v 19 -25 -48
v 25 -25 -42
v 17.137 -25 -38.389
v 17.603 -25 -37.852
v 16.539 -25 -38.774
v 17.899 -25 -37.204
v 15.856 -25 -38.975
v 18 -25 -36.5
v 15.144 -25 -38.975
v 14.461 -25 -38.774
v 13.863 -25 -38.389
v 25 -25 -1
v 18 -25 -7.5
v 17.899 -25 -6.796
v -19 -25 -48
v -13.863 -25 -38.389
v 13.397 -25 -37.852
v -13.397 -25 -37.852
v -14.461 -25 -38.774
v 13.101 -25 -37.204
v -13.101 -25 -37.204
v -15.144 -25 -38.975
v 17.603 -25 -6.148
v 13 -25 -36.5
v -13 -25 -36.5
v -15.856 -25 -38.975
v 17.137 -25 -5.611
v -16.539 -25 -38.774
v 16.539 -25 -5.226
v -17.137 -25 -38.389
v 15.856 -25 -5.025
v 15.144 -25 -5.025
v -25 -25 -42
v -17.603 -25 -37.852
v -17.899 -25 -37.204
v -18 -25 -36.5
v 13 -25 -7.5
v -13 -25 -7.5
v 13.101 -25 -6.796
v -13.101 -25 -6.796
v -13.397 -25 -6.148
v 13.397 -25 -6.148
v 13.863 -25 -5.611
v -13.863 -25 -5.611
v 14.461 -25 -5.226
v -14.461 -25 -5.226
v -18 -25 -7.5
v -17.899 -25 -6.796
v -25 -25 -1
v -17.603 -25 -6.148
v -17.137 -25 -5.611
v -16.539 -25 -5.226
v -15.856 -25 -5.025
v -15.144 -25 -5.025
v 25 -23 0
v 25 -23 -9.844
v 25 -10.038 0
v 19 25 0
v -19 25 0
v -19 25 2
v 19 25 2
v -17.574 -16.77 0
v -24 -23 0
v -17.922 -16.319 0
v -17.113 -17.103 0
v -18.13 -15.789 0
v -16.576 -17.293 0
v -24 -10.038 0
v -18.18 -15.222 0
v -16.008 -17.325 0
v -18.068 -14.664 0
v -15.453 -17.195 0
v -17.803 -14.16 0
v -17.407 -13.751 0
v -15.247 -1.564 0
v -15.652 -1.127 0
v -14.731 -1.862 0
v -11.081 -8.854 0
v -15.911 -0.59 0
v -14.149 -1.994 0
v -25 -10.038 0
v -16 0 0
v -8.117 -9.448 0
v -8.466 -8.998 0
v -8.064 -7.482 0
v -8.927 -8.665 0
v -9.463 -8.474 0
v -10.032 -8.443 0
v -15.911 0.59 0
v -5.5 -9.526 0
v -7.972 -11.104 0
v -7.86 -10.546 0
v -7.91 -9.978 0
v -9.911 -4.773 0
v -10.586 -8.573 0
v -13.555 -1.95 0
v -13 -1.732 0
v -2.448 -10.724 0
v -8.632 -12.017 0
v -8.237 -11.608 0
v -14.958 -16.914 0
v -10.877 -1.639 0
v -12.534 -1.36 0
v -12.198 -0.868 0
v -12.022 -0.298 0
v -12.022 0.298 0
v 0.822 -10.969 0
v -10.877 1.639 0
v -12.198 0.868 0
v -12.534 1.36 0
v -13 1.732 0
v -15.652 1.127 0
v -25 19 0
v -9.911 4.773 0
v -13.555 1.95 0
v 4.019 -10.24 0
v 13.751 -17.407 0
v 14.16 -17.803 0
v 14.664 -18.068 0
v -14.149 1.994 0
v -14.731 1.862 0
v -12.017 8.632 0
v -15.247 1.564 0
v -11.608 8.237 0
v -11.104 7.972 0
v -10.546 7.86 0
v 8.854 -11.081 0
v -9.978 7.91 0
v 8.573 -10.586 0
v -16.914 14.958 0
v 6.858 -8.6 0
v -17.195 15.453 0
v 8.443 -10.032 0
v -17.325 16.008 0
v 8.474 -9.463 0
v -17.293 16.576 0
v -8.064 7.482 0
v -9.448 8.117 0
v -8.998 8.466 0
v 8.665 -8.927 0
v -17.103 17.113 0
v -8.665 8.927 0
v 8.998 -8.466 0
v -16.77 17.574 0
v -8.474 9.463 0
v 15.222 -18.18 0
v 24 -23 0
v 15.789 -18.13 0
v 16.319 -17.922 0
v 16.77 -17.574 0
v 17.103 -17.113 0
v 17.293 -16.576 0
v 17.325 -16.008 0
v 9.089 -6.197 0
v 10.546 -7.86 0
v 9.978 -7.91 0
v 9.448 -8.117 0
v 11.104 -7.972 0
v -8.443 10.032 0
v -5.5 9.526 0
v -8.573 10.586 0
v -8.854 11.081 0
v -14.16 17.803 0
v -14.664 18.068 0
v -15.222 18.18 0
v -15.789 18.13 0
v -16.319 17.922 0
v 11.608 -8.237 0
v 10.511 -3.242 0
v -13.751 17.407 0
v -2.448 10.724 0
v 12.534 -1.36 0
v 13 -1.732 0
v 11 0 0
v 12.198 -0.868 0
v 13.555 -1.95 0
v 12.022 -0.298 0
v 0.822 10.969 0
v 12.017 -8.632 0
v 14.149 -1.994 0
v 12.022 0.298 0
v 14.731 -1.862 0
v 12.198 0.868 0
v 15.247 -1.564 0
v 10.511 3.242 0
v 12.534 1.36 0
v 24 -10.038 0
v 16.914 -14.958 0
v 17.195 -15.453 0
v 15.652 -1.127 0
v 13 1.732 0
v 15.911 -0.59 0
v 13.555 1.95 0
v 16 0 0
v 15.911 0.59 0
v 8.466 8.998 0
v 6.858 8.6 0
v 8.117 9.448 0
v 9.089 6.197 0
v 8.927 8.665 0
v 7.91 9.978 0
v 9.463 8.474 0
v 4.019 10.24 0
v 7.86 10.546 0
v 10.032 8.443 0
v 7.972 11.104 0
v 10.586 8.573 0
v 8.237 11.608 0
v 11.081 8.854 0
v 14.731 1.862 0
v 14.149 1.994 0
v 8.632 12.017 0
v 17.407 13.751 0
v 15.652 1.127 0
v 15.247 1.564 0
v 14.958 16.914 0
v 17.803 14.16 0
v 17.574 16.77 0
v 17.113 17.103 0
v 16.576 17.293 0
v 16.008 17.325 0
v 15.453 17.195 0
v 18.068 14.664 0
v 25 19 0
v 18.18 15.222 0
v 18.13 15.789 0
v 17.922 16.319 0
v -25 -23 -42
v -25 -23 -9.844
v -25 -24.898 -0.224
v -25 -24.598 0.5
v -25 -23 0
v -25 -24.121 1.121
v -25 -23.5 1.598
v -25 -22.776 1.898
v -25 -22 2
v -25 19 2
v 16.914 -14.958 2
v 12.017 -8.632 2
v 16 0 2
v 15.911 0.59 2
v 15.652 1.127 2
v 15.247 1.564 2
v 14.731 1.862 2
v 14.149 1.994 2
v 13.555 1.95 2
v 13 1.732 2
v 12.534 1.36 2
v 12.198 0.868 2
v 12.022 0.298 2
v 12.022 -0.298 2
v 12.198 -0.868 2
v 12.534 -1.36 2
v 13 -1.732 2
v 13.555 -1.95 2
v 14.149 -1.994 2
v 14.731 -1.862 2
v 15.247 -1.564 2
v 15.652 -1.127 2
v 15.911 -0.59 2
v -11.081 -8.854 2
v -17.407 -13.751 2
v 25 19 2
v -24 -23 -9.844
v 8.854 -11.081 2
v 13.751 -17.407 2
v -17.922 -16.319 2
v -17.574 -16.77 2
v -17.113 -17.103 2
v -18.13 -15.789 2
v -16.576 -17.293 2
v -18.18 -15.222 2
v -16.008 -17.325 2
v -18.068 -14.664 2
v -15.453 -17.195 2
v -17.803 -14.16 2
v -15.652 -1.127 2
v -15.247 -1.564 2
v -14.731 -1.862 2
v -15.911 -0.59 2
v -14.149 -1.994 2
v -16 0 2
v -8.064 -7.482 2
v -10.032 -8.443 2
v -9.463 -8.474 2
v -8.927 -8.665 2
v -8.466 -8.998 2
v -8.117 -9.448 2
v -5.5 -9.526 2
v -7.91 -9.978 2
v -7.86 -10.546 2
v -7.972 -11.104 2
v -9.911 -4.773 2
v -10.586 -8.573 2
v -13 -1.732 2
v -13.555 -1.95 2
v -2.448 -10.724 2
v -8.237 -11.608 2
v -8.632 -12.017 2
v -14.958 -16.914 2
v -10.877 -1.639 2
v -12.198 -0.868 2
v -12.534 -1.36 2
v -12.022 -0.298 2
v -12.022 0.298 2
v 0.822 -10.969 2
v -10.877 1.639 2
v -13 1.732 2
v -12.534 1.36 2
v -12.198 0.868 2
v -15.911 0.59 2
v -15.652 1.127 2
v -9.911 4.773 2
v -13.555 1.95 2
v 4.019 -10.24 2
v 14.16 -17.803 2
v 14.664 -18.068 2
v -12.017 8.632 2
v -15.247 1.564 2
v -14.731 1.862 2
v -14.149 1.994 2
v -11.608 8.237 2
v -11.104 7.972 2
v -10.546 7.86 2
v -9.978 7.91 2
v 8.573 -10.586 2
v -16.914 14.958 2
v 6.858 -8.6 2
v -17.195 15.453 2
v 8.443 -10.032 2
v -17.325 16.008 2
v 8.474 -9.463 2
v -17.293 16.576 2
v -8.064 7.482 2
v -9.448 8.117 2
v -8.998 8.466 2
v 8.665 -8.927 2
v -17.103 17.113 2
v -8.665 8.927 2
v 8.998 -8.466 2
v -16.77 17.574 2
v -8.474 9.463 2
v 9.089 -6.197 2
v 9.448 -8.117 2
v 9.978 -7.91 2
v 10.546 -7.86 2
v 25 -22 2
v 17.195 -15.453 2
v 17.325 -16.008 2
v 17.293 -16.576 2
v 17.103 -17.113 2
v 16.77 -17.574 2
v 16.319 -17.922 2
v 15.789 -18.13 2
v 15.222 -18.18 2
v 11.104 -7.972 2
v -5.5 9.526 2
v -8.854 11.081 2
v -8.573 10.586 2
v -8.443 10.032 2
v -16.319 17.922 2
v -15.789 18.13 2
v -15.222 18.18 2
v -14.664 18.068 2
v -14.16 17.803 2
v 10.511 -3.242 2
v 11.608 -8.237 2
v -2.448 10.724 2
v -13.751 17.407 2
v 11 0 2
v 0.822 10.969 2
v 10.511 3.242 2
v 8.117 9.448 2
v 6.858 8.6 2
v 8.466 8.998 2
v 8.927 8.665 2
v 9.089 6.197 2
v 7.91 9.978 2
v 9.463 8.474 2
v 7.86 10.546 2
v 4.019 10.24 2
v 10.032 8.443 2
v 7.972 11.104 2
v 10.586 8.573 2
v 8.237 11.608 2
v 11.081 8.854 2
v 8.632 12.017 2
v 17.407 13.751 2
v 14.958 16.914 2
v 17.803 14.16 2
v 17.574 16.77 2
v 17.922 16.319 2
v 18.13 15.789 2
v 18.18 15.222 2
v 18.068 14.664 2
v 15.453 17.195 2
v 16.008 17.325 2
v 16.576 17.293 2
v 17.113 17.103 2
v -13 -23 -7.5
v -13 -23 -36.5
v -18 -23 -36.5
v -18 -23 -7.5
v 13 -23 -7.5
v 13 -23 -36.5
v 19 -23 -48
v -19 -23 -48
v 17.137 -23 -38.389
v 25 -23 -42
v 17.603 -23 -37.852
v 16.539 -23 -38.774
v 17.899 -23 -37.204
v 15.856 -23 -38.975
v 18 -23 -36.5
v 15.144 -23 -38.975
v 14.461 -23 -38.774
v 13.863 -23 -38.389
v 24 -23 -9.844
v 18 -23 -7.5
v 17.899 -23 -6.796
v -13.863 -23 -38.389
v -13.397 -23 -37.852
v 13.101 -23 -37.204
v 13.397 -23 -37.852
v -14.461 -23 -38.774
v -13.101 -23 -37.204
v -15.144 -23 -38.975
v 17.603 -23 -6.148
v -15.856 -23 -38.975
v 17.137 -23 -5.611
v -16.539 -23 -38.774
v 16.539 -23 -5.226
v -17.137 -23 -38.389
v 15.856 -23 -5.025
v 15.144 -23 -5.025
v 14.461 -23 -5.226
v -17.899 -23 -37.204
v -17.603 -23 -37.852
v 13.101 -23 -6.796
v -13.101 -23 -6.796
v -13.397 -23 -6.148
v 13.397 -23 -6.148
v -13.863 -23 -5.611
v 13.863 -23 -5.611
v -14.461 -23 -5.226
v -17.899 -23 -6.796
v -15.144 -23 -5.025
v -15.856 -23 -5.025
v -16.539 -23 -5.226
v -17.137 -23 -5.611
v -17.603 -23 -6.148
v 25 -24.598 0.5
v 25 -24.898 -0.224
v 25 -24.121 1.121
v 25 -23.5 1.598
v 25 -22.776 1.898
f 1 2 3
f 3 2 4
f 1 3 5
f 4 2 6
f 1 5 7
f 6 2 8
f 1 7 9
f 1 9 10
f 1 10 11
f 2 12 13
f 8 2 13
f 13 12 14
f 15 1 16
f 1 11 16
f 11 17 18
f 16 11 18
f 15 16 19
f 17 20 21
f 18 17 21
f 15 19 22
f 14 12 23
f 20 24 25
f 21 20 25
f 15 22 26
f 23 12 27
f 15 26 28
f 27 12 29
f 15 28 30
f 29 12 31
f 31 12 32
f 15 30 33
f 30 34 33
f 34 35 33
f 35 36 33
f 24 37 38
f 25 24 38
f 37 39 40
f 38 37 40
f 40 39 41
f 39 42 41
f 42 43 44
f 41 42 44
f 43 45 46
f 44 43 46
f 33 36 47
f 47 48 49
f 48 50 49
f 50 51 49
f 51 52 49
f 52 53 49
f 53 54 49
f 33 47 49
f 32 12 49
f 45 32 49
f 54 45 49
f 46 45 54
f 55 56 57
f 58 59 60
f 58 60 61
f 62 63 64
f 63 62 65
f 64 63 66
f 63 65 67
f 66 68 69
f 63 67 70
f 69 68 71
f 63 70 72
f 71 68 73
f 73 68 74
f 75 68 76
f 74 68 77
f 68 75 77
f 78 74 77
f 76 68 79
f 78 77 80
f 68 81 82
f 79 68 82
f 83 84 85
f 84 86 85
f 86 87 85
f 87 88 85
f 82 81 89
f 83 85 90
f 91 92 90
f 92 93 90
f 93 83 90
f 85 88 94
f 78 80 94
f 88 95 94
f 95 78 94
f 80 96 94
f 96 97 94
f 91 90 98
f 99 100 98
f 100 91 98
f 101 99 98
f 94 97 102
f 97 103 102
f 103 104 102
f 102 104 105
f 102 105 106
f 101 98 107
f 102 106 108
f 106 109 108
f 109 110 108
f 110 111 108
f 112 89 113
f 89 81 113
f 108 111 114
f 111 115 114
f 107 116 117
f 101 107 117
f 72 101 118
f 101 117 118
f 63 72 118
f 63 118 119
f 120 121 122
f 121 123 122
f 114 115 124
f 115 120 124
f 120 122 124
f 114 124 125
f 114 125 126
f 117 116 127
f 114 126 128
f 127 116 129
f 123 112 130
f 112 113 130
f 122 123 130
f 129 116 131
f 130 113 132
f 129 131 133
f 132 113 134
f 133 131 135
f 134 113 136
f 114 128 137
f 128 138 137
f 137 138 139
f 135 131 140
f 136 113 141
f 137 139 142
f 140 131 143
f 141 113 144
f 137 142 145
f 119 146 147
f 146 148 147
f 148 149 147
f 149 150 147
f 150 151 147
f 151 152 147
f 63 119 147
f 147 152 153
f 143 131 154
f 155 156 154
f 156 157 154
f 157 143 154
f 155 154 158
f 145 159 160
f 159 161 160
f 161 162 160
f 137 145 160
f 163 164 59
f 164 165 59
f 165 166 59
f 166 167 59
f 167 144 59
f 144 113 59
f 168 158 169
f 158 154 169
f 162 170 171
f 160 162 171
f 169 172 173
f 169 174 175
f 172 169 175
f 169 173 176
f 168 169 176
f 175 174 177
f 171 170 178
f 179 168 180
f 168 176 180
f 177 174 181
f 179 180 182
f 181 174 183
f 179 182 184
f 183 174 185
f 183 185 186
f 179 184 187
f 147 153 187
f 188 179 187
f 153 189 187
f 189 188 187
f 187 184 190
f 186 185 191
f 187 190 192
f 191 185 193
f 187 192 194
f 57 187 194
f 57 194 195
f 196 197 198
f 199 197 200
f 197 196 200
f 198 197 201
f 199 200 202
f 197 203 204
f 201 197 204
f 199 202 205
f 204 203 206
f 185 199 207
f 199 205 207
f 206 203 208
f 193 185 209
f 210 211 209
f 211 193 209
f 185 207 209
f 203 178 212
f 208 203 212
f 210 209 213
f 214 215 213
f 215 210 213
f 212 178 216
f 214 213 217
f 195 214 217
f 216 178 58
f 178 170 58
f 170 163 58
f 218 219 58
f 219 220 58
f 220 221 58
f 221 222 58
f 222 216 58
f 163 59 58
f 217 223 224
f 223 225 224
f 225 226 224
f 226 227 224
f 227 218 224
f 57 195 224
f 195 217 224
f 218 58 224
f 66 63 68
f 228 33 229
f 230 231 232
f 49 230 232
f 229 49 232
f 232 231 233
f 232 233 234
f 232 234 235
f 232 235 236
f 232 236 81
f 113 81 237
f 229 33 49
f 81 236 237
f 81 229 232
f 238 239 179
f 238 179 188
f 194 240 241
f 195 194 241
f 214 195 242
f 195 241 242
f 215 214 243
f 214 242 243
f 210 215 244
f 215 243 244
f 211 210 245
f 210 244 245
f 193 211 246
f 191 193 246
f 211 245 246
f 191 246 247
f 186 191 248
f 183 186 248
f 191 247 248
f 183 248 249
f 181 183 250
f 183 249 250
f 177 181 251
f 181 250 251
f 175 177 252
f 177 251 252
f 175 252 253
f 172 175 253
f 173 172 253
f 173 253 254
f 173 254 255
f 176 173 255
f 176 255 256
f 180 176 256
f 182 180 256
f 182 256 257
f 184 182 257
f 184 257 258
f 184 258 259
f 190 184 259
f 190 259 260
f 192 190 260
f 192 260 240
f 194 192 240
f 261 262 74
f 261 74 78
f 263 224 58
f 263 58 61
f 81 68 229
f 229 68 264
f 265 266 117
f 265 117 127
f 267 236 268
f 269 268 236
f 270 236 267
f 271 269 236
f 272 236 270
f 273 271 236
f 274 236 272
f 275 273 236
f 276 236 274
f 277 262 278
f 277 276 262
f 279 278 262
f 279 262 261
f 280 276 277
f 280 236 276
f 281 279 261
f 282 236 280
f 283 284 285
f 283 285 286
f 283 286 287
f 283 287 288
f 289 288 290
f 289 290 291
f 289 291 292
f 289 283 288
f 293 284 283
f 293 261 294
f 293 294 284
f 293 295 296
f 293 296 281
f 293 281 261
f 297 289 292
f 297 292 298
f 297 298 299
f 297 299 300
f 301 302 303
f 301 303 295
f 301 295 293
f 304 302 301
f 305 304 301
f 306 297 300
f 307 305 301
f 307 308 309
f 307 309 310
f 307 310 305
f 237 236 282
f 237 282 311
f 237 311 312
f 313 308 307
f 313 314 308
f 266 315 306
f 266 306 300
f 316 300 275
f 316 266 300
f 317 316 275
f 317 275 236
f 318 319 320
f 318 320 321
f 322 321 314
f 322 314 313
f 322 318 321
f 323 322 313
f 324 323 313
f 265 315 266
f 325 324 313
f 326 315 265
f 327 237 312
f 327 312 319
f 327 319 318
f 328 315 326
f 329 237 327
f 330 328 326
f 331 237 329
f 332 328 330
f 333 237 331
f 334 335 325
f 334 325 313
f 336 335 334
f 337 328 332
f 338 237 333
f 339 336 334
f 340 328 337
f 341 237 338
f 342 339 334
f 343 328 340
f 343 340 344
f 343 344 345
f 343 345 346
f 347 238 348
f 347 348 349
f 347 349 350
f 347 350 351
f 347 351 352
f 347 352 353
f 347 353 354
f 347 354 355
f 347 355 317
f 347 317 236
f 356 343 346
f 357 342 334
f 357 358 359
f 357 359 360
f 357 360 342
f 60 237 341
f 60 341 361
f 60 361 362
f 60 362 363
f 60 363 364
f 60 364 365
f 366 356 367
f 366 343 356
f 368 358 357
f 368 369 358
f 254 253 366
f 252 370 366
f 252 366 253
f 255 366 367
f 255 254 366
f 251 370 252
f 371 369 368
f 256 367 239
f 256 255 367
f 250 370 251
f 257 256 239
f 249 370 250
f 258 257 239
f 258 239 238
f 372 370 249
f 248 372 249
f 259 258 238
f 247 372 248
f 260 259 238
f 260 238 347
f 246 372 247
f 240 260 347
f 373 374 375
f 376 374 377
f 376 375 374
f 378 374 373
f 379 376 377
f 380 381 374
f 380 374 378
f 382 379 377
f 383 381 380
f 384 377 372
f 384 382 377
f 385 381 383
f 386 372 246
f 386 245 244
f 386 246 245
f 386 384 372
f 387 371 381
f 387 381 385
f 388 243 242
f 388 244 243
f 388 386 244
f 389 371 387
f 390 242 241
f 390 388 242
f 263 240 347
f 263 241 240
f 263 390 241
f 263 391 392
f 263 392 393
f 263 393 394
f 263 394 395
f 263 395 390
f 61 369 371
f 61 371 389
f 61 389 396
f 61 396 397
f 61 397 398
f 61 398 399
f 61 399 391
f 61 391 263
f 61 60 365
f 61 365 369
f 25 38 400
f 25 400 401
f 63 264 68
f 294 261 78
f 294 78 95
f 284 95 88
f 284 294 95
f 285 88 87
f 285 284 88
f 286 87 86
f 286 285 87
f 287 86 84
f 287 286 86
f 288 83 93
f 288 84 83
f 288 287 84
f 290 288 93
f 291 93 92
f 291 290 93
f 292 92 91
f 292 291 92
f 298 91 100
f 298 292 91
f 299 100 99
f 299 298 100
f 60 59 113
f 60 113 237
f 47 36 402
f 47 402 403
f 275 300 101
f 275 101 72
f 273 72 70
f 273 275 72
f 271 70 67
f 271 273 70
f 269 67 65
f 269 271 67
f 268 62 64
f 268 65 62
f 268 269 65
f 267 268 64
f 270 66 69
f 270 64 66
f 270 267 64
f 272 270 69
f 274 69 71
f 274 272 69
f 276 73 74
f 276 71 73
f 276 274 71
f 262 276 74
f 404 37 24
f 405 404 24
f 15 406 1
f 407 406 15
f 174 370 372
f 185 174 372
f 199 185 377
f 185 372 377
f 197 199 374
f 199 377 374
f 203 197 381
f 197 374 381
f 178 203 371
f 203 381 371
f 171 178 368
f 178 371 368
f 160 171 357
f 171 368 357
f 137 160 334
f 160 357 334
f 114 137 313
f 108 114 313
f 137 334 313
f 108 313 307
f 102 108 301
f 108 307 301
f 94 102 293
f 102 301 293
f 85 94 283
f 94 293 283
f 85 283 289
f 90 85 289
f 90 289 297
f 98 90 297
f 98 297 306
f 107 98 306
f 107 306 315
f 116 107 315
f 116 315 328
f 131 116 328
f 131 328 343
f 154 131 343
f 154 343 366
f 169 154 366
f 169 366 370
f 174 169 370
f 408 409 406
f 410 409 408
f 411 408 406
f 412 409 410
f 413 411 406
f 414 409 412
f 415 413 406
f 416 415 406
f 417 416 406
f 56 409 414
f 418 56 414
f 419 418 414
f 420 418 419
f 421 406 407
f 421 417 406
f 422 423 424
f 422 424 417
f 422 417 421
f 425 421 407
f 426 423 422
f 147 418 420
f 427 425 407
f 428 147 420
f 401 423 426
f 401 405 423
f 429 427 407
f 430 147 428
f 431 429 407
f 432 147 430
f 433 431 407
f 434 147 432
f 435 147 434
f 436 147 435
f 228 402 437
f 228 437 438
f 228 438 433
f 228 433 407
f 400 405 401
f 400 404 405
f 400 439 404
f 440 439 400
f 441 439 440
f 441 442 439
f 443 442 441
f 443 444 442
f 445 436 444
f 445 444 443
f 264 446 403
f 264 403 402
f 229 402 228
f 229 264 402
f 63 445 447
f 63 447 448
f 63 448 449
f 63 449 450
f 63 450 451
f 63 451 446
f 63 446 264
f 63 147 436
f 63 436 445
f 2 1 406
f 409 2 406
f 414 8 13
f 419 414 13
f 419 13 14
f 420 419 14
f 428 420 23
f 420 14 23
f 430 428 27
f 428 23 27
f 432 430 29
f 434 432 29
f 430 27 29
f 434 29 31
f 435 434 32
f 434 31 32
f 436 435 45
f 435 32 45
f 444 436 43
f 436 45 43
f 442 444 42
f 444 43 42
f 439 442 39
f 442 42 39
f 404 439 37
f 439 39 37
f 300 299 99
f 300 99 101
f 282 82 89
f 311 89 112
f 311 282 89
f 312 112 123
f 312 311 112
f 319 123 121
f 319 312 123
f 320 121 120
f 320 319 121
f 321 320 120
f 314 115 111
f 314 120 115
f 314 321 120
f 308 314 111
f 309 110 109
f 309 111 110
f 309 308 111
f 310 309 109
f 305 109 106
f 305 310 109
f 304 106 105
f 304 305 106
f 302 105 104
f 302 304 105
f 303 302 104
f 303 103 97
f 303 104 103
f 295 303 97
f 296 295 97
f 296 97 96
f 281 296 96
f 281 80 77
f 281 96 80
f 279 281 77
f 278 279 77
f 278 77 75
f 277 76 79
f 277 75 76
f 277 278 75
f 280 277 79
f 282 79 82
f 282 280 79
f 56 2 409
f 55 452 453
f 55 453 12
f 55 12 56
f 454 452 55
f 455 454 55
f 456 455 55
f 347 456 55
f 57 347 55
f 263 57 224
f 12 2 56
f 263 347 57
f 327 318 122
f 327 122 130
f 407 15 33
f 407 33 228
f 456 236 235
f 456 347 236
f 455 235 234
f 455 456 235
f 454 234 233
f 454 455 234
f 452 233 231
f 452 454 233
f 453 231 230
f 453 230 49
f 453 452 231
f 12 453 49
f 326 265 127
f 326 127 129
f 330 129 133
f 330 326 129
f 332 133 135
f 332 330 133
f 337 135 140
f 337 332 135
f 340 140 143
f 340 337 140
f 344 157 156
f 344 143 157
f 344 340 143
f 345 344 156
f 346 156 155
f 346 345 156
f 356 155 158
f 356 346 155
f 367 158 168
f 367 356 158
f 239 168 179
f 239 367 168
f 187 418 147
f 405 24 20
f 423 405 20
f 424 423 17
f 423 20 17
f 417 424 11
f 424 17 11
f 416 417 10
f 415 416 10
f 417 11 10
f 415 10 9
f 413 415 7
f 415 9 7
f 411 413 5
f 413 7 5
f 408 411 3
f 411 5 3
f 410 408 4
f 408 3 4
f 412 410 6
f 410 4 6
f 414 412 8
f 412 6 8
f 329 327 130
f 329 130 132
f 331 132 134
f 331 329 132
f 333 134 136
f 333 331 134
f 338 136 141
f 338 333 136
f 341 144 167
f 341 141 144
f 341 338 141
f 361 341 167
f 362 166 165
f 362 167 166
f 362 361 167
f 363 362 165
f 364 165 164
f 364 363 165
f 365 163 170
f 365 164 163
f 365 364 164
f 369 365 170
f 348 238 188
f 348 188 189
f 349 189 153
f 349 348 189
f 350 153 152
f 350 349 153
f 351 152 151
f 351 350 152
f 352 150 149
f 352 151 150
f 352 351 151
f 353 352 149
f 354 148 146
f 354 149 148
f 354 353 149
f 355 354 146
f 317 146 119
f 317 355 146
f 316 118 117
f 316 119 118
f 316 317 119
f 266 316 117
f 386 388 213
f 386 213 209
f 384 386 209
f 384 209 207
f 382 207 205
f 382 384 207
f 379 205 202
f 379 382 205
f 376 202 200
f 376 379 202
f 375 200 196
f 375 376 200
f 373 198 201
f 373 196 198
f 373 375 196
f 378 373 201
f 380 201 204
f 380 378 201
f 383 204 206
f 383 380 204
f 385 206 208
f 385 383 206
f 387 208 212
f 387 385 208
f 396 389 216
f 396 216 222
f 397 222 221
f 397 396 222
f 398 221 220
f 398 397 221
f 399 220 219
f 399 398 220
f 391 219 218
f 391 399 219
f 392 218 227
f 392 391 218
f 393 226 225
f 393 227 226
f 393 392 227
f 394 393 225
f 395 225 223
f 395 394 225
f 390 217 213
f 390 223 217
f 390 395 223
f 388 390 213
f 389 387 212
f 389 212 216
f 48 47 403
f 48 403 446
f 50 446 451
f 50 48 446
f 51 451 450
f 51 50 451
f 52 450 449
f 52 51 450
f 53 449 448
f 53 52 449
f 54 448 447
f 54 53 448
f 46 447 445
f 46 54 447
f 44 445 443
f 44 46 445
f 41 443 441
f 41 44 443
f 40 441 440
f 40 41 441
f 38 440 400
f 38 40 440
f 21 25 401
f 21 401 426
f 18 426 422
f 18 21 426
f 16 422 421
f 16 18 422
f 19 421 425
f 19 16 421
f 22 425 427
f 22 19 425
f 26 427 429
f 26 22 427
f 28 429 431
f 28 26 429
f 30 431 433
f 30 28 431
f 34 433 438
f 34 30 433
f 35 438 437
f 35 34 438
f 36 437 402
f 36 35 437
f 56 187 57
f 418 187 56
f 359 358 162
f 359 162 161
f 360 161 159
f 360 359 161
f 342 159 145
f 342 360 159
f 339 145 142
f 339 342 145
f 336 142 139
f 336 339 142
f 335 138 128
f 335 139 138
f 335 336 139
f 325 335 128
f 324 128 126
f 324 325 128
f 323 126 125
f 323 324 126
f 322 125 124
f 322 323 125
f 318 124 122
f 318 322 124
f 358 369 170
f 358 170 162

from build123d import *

# Parameters (mm, degrees)
SKETCH1_W           = 50
SKETCH1_H           = 50
BOSS_EXTRUDE1_DEPTH = 2
SKETCH2_R           = 11
CUT_EXTRUDE1_DEPTH  = 36.411862419
CHAMFER1_SIZE       = 6
CHAMFER2_SIZE       = 6
CUT_EXTRUDE2_DEPTH  = 36.411862419
CIRPATTERN1_COUNT   = 4
SKETCH4_R           = 2
CUT_EXTRUDE3_DEPTH  = 36.411862419
SKETCH5_W           = 50
SKETCH5_H           = 2
BOSS_EXTRUDE5_DEPTH = 48
CHAMFER3_SIZE       = 6
CHAMFER4_SIZE       = 6
CUT_EXTRUDE5_DEPTH  = 74.681748079
BOSS_EXTRUDE6_START = -1
BOSS_EXTRUDE6_DEPTH = 1.000012
FILLET1_R           = 3


with BuildPart() as part:
    # Sketch1 → Boss-Extrude1 (new body)
    with BuildSketch(Plane.XY):
        Rectangle(SKETCH1_W, SKETCH1_H)
    extrude(amount=BOSS_EXTRUDE1_DEPTH)

    # Sketch2 → Cut-Extrude1 (cut, through all)
    with BuildSketch(Plane.XY.offset(2)):
        Circle(SKETCH2_R)
    extrude(amount=-CUT_EXTRUDE1_DEPTH, mode=Mode.SUBTRACT)

    # Chamfer1
    chamfer1_edges = [part.edges().sort_by_distance(p)[0] for p in [
        (-25, 25, 1),
    ]]
    chamfer(chamfer1_edges, length=CHAMFER1_SIZE)

    # Chamfer2
    chamfer2_edges = [part.edges().sort_by_distance(p)[0] for p in [
        (25, 25, 1),
    ]]
    chamfer(chamfer2_edges, length=CHAMFER2_SIZE)

    # Sketch3 → Cut-Extrude2 (cut, through all)
    with BuildSketch(Plane.XY.offset(2)):
        with BuildLine():
            Line((8.63247336, 12.016622274), (14.958263021, 16.914007818))
            ThreePointArc((14.958263021, 16.914007818), (17.764056822, 16.556906789), (17.406955793, 13.751112987))
            Line((17.406955793, 13.751112987), (11.081166132, 8.853727444))
            ThreePointArc((11.081166132, 8.853727444), (8.27537233, 9.210828473), (8.63247336, 12.016622274))
        make_face()
    cut_extrude2 = extrude(amount=-CUT_EXTRUDE2_DEPTH, mode=Mode.SUBTRACT)

    # CirPattern1: Cut-Extrude2 ×4 about axis
    cirpattern1_axis = Axis((0, 0, 0), (0, 0, 1))
    for i in range(1, CIRPATTERN1_COUNT):
        add(cut_extrude2.rotate(cirpattern1_axis, i * 360 / CIRPATTERN1_COUNT), mode=Mode.SUBTRACT)

    # Sketch4 → Cut-Extrude3 (cut, through all)
    with BuildSketch(Plane.XY.offset(2)):
        with Locations((14, 0)):
            Circle(SKETCH4_R)
    cut_extrude3 = extrude(amount=-CUT_EXTRUDE3_DEPTH, mode=Mode.SUBTRACT)

    # Mirror5: Cut-Extrude3 across plane
    add(cut_extrude3.mirror(Plane(origin=(0, 0, 0), x_dir=(0, 0, 1), z_dir=(1, 0, 0))), mode=Mode.SUBTRACT)

    # Sketch5 → Boss-Extrude5 (add)
    with BuildSketch(Plane(origin=(0, 0, 0), x_dir=(-1, 0, 0), z_dir=(0, 0, -1))):
        with Locations((0, -24)):
            Rectangle(SKETCH5_W, SKETCH5_H)
    extrude(amount=BOSS_EXTRUDE5_DEPTH)

    # Chamfer3
    chamfer3_edges = [part.edges().sort_by_distance(p)[0] for p in [
        (25, -24, -48),
    ]]
    chamfer(chamfer3_edges, length=CHAMFER3_SIZE)

    # Chamfer4
    chamfer4_edges = [part.edges().sort_by_distance(p)[0] for p in [
        (-25, -24, -48),
    ]]
    chamfer(chamfer4_edges, length=CHAMFER4_SIZE)

    # Sketch7 → Cut-Extrude5 (cut, through all)
    with BuildSketch(Plane.XZ.offset(25)):
        with BuildLine():
            Line((-13, -7.5), (-13, -36.5))
            ThreePointArc((-13, -36.5), (-15.5, -39), (-18, -36.5))
            Line((-18, -36.5), (-18, -7.5))
            ThreePointArc((-18, -7.5), (-15.5, -5), (-13, -7.5))
        make_face()
    cut_extrude5 = extrude(amount=-CUT_EXTRUDE5_DEPTH, mode=Mode.SUBTRACT)

    # Mirror8: Cut-Extrude5 across plane
    add(cut_extrude5.mirror(Plane(origin=(0, 0, 0), x_dir=(0, 0, 1), z_dir=(1, 0, 0))), mode=Mode.SUBTRACT)

    # Sketch8 → Boss-Extrude6 (add)
    with BuildSketch(Plane(origin=(25, 0, 0), x_dir=(0, 0, -1), z_dir=(1, 0, 0)).offset(BOSS_EXTRUDE6_START)):
        Polygon((0, -10.038318293), (9.843932034, -23), (0, -23), align=None)
    boss_extrude6 = extrude(amount=BOSS_EXTRUDE6_DEPTH)

    # Mirror9: Boss-Extrude6 across plane
    add(boss_extrude6.mirror(Plane(origin=(0, 0, 0), x_dir=(0, 0, 1), z_dir=(1, 0, 0))))

    # Fillet1
    fillet1_edges = [part.edges().sort_by_distance(p)[0] for p in [
        (0, -25, 2),
    ]]
    fillet(fillet1_edges, radius=FILLET1_R)


solid = part.part
